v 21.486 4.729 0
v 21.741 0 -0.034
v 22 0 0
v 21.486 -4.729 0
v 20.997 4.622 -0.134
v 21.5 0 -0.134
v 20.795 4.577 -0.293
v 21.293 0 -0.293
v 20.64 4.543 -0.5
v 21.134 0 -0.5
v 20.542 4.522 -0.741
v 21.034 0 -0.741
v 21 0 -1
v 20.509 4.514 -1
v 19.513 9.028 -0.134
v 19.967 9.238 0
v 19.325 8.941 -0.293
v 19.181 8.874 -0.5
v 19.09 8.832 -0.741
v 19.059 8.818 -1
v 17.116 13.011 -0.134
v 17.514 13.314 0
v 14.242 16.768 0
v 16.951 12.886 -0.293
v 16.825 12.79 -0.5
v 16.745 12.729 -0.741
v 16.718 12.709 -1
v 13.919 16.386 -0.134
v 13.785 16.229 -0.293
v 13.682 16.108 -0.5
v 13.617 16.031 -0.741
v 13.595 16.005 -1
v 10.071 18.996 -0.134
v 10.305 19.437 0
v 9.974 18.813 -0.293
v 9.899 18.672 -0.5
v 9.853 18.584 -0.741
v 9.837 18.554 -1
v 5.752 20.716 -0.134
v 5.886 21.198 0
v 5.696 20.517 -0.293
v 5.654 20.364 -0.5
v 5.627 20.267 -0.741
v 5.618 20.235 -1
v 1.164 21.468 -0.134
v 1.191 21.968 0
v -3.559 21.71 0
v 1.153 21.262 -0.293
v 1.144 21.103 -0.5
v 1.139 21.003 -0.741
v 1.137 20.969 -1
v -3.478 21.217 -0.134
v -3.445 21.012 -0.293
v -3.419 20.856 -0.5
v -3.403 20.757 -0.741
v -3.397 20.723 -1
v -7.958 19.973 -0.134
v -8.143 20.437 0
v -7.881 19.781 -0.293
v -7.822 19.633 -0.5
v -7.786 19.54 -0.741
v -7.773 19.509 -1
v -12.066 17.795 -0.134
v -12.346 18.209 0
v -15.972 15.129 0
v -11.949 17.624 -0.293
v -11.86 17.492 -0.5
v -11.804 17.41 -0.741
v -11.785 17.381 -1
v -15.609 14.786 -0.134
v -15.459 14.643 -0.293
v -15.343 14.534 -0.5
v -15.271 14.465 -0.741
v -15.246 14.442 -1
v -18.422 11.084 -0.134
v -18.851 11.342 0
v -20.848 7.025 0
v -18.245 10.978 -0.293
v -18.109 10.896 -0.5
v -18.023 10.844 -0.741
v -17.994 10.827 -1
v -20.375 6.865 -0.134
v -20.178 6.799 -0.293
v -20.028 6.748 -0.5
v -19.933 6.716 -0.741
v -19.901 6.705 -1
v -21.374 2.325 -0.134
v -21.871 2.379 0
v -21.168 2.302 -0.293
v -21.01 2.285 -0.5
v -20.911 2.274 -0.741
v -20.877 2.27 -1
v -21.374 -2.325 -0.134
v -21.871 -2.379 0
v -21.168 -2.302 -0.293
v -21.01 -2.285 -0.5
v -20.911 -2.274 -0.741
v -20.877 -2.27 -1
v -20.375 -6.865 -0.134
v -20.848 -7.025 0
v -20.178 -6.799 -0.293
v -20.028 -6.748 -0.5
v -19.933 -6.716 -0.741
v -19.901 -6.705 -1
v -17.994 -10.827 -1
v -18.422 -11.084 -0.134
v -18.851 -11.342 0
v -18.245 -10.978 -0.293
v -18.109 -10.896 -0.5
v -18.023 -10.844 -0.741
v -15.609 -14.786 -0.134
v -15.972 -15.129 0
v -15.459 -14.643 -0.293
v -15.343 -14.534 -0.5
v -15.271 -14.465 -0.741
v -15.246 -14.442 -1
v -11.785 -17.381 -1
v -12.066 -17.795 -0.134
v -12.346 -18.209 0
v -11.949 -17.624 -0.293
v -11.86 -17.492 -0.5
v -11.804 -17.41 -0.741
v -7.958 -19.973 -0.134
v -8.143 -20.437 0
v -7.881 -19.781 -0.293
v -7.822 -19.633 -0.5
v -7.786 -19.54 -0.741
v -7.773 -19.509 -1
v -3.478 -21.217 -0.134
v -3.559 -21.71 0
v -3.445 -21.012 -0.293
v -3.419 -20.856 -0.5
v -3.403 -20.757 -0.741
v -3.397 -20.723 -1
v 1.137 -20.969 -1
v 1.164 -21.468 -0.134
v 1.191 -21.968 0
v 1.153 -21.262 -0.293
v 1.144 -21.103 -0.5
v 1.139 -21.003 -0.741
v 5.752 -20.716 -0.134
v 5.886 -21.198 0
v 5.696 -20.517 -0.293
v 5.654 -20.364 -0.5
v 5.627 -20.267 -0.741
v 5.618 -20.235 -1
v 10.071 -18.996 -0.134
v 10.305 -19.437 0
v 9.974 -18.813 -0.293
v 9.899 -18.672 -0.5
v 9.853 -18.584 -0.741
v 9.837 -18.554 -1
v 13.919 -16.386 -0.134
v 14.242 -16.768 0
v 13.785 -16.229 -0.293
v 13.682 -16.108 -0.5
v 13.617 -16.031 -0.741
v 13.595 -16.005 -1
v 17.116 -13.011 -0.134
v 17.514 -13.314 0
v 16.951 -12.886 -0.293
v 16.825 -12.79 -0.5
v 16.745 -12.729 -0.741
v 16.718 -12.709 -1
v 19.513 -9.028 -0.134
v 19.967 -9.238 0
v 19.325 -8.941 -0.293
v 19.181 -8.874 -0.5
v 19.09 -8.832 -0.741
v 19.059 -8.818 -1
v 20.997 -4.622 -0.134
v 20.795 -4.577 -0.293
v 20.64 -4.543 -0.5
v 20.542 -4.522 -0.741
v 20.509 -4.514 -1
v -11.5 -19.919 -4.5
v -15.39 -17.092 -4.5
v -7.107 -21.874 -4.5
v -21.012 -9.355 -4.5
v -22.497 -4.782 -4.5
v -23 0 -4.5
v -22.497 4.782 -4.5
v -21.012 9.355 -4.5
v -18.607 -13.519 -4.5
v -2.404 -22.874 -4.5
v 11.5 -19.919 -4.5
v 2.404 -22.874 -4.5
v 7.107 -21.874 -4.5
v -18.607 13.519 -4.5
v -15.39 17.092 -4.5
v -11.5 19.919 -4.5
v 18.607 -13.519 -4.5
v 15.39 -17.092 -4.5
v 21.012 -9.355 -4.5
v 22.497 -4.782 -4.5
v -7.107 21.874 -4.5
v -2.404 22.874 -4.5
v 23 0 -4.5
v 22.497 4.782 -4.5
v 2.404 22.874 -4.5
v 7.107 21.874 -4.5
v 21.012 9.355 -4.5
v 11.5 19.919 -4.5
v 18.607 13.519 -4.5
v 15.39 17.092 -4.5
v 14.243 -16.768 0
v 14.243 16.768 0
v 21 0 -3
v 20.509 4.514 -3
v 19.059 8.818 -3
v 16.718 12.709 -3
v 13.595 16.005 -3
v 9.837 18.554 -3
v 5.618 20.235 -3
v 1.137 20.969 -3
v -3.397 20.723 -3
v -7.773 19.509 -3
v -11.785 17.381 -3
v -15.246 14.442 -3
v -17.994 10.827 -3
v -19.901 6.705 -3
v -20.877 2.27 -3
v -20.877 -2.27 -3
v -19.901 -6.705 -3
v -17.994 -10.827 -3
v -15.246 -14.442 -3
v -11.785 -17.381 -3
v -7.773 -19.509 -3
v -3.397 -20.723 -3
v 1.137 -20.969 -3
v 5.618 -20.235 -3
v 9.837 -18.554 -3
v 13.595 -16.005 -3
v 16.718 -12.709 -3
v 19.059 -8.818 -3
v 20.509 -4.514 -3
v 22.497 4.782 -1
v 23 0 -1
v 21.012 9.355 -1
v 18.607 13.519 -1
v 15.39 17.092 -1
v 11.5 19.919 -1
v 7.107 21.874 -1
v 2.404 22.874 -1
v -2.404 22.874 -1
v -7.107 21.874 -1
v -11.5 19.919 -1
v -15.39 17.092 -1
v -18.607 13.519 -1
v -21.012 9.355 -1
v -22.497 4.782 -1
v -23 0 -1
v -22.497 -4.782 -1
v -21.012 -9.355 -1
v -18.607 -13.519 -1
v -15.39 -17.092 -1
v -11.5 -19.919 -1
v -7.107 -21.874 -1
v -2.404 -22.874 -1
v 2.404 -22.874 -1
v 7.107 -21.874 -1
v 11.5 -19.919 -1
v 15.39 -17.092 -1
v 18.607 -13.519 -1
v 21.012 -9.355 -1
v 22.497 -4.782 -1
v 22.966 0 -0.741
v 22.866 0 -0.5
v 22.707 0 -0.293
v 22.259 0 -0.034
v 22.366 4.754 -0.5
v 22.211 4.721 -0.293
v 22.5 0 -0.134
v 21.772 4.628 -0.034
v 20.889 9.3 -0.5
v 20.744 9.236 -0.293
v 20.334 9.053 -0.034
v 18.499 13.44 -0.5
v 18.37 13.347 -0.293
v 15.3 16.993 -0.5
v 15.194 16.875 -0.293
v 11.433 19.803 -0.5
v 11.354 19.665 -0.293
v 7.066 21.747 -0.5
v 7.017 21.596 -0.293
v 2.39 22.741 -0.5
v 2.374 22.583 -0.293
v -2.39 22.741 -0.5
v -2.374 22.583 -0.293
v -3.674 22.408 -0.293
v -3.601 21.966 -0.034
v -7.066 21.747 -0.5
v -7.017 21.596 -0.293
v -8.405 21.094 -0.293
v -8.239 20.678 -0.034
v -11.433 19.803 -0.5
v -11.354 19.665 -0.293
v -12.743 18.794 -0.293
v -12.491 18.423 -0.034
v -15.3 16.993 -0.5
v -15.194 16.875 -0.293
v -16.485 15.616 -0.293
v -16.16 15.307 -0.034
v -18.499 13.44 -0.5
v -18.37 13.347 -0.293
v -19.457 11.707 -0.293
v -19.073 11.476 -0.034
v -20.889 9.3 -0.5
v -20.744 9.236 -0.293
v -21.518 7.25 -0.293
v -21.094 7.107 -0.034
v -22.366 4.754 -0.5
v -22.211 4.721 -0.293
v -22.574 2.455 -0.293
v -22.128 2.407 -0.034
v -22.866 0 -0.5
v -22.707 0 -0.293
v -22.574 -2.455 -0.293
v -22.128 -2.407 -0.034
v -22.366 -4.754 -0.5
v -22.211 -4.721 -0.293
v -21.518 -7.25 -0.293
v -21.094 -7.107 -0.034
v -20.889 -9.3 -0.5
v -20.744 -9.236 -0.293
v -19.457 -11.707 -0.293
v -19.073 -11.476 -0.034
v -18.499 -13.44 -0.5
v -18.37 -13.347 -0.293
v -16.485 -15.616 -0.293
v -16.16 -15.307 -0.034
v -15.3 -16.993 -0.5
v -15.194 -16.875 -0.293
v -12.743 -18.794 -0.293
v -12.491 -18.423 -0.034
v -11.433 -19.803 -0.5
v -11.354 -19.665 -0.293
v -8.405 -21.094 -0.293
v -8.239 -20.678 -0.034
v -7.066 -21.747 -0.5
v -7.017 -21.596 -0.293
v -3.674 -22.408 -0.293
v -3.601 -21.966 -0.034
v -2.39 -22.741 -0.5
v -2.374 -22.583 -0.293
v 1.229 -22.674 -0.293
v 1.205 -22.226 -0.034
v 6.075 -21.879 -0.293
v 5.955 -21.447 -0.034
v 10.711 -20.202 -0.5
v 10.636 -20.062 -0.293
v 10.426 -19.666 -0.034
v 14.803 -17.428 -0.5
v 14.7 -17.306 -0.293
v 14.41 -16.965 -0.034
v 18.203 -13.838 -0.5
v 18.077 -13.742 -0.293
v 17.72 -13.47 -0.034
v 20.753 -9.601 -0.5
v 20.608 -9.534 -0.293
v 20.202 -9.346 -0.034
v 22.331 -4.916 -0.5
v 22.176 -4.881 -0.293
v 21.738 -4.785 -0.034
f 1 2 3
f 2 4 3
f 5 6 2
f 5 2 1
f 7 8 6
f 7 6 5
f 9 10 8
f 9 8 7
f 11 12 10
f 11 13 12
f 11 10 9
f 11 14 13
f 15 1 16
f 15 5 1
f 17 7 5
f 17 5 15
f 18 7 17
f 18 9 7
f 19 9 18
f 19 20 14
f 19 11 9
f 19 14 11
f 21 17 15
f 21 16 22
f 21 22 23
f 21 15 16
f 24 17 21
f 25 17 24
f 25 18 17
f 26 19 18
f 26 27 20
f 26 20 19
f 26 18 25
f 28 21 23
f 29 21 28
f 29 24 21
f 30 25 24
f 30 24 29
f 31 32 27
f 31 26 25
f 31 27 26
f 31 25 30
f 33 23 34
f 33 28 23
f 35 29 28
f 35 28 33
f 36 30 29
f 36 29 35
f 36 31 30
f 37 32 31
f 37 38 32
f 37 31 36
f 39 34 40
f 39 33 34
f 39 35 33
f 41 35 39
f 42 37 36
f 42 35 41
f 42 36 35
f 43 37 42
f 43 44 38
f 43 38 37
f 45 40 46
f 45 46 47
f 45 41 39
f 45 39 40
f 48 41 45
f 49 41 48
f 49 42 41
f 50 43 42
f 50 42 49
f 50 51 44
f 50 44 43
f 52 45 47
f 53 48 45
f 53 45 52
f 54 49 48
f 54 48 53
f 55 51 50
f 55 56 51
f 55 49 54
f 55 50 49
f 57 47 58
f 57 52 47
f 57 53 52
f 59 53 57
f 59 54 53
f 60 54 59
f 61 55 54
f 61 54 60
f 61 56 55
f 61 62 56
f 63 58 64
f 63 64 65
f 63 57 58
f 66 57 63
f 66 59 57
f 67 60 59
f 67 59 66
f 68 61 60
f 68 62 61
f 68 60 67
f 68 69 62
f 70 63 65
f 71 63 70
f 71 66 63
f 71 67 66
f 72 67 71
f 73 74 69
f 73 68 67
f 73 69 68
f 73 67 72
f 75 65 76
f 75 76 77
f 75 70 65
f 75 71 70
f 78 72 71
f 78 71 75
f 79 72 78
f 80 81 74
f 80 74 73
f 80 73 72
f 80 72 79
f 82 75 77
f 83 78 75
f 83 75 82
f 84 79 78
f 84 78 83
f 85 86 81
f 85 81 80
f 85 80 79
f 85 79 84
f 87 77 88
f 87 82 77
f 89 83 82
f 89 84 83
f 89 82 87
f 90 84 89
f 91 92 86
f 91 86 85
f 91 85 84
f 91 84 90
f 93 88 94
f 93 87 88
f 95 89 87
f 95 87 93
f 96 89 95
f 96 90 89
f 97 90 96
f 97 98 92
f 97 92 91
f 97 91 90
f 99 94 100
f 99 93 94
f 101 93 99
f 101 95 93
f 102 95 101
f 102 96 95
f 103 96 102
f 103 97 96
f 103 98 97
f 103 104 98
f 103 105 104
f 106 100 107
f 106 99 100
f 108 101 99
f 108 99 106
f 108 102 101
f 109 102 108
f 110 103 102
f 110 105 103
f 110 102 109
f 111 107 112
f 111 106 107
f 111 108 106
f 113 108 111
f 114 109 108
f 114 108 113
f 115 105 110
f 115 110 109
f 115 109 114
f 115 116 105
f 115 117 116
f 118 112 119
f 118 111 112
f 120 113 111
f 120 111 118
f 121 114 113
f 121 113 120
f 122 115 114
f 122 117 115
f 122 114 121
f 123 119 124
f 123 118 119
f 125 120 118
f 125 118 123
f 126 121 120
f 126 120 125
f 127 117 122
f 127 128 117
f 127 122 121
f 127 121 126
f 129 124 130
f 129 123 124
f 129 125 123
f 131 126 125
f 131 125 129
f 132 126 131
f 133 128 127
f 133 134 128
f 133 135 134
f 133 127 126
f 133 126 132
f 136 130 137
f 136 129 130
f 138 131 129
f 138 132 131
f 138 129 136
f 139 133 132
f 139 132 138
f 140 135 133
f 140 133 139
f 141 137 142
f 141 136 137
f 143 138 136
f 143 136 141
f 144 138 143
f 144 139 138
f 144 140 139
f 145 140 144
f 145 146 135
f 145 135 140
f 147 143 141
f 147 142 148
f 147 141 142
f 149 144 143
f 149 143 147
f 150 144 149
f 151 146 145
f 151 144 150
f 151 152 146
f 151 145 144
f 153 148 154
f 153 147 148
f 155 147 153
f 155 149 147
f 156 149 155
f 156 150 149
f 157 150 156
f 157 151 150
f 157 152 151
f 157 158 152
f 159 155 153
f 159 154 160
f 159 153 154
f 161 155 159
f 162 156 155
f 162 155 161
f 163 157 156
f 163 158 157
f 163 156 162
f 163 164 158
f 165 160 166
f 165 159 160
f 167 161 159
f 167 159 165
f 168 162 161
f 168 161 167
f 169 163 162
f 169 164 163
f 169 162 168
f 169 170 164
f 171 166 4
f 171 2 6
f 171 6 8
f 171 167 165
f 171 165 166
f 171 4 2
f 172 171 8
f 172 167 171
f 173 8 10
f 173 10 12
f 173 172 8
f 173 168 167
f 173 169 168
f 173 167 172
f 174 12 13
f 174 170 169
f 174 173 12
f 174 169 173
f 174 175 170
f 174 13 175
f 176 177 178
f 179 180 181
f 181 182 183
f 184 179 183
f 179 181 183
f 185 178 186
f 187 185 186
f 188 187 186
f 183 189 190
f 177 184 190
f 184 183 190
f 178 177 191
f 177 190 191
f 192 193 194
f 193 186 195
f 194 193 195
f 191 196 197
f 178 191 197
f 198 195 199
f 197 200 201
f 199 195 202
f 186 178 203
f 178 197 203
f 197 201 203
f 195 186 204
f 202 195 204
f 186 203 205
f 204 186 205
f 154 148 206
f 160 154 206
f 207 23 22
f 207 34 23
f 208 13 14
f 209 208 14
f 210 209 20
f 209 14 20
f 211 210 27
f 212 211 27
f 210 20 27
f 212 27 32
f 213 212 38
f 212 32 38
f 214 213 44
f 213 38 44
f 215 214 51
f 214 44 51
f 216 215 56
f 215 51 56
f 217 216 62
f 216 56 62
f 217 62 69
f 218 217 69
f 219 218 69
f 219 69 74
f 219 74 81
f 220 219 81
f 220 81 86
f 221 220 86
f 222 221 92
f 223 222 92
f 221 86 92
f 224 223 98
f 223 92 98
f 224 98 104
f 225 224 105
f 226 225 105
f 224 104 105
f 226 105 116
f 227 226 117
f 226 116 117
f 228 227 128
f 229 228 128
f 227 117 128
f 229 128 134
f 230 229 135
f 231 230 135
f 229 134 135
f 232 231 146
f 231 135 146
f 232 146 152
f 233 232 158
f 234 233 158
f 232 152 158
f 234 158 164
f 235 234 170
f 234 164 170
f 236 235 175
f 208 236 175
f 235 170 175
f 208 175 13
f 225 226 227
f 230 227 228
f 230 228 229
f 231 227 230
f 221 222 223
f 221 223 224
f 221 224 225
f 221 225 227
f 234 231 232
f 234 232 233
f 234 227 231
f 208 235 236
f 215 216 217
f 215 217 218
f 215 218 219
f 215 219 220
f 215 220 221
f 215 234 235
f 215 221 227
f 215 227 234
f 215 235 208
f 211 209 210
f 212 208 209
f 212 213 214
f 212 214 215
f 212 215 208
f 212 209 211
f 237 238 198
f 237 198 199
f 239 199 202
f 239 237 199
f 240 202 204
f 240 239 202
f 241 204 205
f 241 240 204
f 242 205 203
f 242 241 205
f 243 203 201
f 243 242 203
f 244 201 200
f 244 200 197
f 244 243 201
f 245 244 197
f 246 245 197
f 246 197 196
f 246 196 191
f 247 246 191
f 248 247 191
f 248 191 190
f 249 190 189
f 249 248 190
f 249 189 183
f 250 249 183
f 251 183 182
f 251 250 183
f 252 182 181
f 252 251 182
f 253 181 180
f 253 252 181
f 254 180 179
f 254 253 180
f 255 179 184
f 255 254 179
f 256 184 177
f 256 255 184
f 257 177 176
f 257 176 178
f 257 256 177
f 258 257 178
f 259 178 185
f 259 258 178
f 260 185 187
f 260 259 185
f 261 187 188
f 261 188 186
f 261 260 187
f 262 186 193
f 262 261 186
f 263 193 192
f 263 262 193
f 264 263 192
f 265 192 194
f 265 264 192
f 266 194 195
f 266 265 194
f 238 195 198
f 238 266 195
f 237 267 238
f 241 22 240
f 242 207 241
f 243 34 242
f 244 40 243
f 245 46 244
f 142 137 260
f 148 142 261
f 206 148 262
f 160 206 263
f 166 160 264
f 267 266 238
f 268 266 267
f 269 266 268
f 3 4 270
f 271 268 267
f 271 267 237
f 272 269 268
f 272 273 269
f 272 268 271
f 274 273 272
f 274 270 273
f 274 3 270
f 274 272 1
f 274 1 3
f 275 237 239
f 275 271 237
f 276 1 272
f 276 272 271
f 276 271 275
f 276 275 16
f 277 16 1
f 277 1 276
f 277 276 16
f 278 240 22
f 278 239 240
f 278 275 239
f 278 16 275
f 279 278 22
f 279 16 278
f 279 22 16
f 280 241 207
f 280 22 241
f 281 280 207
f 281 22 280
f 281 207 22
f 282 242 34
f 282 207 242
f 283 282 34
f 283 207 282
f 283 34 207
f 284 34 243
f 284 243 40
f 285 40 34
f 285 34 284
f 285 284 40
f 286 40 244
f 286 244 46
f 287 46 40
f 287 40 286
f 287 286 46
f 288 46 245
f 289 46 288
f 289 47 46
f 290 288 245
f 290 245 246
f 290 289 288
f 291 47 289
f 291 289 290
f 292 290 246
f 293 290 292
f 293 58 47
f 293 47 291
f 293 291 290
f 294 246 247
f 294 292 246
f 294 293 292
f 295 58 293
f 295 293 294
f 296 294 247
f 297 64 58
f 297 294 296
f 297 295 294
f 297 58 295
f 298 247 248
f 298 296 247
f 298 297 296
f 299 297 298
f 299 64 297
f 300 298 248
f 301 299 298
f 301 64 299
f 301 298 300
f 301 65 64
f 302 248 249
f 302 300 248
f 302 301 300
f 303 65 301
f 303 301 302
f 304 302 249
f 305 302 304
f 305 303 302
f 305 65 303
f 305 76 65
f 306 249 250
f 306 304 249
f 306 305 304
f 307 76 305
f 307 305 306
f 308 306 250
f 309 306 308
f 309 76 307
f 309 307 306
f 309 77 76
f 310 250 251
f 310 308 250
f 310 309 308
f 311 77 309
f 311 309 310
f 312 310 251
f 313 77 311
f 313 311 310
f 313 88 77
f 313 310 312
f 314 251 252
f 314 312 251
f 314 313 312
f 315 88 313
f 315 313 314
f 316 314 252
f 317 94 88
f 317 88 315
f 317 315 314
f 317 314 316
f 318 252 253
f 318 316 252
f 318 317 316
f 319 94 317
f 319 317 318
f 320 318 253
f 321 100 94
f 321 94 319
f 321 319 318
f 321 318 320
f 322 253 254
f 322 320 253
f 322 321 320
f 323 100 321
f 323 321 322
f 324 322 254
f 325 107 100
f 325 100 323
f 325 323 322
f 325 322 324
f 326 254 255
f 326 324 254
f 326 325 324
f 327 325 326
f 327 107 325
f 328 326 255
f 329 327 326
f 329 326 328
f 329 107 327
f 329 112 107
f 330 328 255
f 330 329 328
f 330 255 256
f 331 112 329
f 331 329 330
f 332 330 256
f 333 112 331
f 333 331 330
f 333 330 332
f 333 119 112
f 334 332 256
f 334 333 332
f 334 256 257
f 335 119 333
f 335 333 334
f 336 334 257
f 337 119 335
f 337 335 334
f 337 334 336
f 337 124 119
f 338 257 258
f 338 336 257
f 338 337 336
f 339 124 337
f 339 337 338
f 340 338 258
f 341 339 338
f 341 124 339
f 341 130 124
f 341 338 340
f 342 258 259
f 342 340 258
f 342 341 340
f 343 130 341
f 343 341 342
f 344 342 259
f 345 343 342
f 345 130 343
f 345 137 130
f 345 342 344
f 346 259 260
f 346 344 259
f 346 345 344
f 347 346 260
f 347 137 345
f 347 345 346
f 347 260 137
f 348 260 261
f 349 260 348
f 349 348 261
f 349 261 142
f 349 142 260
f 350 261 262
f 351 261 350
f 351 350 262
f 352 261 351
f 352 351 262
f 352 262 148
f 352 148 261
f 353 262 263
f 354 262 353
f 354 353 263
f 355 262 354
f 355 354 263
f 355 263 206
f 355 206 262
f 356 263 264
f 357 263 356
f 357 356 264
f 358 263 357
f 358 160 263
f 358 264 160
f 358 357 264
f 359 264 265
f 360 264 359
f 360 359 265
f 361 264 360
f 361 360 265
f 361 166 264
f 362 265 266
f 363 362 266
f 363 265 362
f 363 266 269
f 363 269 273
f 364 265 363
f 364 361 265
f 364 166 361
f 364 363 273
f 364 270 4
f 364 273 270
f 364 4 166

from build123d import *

# Parameters (mm, degrees)
F0_R     = 23
F0_R_2   = 21
F1_DEPTH = 4.5
F2_DEPTH = 3
F3_R     = 0.99999


# Not quite as in the source:
# - a fillet or chamfer is up to 0.001 mm smaller than in the source, because OpenCascade refuses the exact size


with BuildPart() as f1:
    # F0 (on Top) → F1 (new body)
    with BuildSketch(Plane.XY):
        Circle(F0_R)
        Circle(F0_R_2, mode=Mode.SUBTRACT)
        Circle(F0_R_2)
    extrude(amount=-F1_DEPTH)

    # F0 (on Top) → F2 (cut)
    with BuildSketch(Plane.XY):
        Circle(F0_R_2)
    extrude(amount=-F2_DEPTH, mode=Mode.SUBTRACT)

    # F3 (radius 1 in the source; OpenCascade refuses exactly that, so slightly less here)
    f3_edges = [f1.edges().sort_by_distance(p)[0] for p in [
        (-21, 0, 0),
        (-23, 0, 0),
    ]]
    fillet(f3_edges, radius=F3_R)


solid = f1.part
